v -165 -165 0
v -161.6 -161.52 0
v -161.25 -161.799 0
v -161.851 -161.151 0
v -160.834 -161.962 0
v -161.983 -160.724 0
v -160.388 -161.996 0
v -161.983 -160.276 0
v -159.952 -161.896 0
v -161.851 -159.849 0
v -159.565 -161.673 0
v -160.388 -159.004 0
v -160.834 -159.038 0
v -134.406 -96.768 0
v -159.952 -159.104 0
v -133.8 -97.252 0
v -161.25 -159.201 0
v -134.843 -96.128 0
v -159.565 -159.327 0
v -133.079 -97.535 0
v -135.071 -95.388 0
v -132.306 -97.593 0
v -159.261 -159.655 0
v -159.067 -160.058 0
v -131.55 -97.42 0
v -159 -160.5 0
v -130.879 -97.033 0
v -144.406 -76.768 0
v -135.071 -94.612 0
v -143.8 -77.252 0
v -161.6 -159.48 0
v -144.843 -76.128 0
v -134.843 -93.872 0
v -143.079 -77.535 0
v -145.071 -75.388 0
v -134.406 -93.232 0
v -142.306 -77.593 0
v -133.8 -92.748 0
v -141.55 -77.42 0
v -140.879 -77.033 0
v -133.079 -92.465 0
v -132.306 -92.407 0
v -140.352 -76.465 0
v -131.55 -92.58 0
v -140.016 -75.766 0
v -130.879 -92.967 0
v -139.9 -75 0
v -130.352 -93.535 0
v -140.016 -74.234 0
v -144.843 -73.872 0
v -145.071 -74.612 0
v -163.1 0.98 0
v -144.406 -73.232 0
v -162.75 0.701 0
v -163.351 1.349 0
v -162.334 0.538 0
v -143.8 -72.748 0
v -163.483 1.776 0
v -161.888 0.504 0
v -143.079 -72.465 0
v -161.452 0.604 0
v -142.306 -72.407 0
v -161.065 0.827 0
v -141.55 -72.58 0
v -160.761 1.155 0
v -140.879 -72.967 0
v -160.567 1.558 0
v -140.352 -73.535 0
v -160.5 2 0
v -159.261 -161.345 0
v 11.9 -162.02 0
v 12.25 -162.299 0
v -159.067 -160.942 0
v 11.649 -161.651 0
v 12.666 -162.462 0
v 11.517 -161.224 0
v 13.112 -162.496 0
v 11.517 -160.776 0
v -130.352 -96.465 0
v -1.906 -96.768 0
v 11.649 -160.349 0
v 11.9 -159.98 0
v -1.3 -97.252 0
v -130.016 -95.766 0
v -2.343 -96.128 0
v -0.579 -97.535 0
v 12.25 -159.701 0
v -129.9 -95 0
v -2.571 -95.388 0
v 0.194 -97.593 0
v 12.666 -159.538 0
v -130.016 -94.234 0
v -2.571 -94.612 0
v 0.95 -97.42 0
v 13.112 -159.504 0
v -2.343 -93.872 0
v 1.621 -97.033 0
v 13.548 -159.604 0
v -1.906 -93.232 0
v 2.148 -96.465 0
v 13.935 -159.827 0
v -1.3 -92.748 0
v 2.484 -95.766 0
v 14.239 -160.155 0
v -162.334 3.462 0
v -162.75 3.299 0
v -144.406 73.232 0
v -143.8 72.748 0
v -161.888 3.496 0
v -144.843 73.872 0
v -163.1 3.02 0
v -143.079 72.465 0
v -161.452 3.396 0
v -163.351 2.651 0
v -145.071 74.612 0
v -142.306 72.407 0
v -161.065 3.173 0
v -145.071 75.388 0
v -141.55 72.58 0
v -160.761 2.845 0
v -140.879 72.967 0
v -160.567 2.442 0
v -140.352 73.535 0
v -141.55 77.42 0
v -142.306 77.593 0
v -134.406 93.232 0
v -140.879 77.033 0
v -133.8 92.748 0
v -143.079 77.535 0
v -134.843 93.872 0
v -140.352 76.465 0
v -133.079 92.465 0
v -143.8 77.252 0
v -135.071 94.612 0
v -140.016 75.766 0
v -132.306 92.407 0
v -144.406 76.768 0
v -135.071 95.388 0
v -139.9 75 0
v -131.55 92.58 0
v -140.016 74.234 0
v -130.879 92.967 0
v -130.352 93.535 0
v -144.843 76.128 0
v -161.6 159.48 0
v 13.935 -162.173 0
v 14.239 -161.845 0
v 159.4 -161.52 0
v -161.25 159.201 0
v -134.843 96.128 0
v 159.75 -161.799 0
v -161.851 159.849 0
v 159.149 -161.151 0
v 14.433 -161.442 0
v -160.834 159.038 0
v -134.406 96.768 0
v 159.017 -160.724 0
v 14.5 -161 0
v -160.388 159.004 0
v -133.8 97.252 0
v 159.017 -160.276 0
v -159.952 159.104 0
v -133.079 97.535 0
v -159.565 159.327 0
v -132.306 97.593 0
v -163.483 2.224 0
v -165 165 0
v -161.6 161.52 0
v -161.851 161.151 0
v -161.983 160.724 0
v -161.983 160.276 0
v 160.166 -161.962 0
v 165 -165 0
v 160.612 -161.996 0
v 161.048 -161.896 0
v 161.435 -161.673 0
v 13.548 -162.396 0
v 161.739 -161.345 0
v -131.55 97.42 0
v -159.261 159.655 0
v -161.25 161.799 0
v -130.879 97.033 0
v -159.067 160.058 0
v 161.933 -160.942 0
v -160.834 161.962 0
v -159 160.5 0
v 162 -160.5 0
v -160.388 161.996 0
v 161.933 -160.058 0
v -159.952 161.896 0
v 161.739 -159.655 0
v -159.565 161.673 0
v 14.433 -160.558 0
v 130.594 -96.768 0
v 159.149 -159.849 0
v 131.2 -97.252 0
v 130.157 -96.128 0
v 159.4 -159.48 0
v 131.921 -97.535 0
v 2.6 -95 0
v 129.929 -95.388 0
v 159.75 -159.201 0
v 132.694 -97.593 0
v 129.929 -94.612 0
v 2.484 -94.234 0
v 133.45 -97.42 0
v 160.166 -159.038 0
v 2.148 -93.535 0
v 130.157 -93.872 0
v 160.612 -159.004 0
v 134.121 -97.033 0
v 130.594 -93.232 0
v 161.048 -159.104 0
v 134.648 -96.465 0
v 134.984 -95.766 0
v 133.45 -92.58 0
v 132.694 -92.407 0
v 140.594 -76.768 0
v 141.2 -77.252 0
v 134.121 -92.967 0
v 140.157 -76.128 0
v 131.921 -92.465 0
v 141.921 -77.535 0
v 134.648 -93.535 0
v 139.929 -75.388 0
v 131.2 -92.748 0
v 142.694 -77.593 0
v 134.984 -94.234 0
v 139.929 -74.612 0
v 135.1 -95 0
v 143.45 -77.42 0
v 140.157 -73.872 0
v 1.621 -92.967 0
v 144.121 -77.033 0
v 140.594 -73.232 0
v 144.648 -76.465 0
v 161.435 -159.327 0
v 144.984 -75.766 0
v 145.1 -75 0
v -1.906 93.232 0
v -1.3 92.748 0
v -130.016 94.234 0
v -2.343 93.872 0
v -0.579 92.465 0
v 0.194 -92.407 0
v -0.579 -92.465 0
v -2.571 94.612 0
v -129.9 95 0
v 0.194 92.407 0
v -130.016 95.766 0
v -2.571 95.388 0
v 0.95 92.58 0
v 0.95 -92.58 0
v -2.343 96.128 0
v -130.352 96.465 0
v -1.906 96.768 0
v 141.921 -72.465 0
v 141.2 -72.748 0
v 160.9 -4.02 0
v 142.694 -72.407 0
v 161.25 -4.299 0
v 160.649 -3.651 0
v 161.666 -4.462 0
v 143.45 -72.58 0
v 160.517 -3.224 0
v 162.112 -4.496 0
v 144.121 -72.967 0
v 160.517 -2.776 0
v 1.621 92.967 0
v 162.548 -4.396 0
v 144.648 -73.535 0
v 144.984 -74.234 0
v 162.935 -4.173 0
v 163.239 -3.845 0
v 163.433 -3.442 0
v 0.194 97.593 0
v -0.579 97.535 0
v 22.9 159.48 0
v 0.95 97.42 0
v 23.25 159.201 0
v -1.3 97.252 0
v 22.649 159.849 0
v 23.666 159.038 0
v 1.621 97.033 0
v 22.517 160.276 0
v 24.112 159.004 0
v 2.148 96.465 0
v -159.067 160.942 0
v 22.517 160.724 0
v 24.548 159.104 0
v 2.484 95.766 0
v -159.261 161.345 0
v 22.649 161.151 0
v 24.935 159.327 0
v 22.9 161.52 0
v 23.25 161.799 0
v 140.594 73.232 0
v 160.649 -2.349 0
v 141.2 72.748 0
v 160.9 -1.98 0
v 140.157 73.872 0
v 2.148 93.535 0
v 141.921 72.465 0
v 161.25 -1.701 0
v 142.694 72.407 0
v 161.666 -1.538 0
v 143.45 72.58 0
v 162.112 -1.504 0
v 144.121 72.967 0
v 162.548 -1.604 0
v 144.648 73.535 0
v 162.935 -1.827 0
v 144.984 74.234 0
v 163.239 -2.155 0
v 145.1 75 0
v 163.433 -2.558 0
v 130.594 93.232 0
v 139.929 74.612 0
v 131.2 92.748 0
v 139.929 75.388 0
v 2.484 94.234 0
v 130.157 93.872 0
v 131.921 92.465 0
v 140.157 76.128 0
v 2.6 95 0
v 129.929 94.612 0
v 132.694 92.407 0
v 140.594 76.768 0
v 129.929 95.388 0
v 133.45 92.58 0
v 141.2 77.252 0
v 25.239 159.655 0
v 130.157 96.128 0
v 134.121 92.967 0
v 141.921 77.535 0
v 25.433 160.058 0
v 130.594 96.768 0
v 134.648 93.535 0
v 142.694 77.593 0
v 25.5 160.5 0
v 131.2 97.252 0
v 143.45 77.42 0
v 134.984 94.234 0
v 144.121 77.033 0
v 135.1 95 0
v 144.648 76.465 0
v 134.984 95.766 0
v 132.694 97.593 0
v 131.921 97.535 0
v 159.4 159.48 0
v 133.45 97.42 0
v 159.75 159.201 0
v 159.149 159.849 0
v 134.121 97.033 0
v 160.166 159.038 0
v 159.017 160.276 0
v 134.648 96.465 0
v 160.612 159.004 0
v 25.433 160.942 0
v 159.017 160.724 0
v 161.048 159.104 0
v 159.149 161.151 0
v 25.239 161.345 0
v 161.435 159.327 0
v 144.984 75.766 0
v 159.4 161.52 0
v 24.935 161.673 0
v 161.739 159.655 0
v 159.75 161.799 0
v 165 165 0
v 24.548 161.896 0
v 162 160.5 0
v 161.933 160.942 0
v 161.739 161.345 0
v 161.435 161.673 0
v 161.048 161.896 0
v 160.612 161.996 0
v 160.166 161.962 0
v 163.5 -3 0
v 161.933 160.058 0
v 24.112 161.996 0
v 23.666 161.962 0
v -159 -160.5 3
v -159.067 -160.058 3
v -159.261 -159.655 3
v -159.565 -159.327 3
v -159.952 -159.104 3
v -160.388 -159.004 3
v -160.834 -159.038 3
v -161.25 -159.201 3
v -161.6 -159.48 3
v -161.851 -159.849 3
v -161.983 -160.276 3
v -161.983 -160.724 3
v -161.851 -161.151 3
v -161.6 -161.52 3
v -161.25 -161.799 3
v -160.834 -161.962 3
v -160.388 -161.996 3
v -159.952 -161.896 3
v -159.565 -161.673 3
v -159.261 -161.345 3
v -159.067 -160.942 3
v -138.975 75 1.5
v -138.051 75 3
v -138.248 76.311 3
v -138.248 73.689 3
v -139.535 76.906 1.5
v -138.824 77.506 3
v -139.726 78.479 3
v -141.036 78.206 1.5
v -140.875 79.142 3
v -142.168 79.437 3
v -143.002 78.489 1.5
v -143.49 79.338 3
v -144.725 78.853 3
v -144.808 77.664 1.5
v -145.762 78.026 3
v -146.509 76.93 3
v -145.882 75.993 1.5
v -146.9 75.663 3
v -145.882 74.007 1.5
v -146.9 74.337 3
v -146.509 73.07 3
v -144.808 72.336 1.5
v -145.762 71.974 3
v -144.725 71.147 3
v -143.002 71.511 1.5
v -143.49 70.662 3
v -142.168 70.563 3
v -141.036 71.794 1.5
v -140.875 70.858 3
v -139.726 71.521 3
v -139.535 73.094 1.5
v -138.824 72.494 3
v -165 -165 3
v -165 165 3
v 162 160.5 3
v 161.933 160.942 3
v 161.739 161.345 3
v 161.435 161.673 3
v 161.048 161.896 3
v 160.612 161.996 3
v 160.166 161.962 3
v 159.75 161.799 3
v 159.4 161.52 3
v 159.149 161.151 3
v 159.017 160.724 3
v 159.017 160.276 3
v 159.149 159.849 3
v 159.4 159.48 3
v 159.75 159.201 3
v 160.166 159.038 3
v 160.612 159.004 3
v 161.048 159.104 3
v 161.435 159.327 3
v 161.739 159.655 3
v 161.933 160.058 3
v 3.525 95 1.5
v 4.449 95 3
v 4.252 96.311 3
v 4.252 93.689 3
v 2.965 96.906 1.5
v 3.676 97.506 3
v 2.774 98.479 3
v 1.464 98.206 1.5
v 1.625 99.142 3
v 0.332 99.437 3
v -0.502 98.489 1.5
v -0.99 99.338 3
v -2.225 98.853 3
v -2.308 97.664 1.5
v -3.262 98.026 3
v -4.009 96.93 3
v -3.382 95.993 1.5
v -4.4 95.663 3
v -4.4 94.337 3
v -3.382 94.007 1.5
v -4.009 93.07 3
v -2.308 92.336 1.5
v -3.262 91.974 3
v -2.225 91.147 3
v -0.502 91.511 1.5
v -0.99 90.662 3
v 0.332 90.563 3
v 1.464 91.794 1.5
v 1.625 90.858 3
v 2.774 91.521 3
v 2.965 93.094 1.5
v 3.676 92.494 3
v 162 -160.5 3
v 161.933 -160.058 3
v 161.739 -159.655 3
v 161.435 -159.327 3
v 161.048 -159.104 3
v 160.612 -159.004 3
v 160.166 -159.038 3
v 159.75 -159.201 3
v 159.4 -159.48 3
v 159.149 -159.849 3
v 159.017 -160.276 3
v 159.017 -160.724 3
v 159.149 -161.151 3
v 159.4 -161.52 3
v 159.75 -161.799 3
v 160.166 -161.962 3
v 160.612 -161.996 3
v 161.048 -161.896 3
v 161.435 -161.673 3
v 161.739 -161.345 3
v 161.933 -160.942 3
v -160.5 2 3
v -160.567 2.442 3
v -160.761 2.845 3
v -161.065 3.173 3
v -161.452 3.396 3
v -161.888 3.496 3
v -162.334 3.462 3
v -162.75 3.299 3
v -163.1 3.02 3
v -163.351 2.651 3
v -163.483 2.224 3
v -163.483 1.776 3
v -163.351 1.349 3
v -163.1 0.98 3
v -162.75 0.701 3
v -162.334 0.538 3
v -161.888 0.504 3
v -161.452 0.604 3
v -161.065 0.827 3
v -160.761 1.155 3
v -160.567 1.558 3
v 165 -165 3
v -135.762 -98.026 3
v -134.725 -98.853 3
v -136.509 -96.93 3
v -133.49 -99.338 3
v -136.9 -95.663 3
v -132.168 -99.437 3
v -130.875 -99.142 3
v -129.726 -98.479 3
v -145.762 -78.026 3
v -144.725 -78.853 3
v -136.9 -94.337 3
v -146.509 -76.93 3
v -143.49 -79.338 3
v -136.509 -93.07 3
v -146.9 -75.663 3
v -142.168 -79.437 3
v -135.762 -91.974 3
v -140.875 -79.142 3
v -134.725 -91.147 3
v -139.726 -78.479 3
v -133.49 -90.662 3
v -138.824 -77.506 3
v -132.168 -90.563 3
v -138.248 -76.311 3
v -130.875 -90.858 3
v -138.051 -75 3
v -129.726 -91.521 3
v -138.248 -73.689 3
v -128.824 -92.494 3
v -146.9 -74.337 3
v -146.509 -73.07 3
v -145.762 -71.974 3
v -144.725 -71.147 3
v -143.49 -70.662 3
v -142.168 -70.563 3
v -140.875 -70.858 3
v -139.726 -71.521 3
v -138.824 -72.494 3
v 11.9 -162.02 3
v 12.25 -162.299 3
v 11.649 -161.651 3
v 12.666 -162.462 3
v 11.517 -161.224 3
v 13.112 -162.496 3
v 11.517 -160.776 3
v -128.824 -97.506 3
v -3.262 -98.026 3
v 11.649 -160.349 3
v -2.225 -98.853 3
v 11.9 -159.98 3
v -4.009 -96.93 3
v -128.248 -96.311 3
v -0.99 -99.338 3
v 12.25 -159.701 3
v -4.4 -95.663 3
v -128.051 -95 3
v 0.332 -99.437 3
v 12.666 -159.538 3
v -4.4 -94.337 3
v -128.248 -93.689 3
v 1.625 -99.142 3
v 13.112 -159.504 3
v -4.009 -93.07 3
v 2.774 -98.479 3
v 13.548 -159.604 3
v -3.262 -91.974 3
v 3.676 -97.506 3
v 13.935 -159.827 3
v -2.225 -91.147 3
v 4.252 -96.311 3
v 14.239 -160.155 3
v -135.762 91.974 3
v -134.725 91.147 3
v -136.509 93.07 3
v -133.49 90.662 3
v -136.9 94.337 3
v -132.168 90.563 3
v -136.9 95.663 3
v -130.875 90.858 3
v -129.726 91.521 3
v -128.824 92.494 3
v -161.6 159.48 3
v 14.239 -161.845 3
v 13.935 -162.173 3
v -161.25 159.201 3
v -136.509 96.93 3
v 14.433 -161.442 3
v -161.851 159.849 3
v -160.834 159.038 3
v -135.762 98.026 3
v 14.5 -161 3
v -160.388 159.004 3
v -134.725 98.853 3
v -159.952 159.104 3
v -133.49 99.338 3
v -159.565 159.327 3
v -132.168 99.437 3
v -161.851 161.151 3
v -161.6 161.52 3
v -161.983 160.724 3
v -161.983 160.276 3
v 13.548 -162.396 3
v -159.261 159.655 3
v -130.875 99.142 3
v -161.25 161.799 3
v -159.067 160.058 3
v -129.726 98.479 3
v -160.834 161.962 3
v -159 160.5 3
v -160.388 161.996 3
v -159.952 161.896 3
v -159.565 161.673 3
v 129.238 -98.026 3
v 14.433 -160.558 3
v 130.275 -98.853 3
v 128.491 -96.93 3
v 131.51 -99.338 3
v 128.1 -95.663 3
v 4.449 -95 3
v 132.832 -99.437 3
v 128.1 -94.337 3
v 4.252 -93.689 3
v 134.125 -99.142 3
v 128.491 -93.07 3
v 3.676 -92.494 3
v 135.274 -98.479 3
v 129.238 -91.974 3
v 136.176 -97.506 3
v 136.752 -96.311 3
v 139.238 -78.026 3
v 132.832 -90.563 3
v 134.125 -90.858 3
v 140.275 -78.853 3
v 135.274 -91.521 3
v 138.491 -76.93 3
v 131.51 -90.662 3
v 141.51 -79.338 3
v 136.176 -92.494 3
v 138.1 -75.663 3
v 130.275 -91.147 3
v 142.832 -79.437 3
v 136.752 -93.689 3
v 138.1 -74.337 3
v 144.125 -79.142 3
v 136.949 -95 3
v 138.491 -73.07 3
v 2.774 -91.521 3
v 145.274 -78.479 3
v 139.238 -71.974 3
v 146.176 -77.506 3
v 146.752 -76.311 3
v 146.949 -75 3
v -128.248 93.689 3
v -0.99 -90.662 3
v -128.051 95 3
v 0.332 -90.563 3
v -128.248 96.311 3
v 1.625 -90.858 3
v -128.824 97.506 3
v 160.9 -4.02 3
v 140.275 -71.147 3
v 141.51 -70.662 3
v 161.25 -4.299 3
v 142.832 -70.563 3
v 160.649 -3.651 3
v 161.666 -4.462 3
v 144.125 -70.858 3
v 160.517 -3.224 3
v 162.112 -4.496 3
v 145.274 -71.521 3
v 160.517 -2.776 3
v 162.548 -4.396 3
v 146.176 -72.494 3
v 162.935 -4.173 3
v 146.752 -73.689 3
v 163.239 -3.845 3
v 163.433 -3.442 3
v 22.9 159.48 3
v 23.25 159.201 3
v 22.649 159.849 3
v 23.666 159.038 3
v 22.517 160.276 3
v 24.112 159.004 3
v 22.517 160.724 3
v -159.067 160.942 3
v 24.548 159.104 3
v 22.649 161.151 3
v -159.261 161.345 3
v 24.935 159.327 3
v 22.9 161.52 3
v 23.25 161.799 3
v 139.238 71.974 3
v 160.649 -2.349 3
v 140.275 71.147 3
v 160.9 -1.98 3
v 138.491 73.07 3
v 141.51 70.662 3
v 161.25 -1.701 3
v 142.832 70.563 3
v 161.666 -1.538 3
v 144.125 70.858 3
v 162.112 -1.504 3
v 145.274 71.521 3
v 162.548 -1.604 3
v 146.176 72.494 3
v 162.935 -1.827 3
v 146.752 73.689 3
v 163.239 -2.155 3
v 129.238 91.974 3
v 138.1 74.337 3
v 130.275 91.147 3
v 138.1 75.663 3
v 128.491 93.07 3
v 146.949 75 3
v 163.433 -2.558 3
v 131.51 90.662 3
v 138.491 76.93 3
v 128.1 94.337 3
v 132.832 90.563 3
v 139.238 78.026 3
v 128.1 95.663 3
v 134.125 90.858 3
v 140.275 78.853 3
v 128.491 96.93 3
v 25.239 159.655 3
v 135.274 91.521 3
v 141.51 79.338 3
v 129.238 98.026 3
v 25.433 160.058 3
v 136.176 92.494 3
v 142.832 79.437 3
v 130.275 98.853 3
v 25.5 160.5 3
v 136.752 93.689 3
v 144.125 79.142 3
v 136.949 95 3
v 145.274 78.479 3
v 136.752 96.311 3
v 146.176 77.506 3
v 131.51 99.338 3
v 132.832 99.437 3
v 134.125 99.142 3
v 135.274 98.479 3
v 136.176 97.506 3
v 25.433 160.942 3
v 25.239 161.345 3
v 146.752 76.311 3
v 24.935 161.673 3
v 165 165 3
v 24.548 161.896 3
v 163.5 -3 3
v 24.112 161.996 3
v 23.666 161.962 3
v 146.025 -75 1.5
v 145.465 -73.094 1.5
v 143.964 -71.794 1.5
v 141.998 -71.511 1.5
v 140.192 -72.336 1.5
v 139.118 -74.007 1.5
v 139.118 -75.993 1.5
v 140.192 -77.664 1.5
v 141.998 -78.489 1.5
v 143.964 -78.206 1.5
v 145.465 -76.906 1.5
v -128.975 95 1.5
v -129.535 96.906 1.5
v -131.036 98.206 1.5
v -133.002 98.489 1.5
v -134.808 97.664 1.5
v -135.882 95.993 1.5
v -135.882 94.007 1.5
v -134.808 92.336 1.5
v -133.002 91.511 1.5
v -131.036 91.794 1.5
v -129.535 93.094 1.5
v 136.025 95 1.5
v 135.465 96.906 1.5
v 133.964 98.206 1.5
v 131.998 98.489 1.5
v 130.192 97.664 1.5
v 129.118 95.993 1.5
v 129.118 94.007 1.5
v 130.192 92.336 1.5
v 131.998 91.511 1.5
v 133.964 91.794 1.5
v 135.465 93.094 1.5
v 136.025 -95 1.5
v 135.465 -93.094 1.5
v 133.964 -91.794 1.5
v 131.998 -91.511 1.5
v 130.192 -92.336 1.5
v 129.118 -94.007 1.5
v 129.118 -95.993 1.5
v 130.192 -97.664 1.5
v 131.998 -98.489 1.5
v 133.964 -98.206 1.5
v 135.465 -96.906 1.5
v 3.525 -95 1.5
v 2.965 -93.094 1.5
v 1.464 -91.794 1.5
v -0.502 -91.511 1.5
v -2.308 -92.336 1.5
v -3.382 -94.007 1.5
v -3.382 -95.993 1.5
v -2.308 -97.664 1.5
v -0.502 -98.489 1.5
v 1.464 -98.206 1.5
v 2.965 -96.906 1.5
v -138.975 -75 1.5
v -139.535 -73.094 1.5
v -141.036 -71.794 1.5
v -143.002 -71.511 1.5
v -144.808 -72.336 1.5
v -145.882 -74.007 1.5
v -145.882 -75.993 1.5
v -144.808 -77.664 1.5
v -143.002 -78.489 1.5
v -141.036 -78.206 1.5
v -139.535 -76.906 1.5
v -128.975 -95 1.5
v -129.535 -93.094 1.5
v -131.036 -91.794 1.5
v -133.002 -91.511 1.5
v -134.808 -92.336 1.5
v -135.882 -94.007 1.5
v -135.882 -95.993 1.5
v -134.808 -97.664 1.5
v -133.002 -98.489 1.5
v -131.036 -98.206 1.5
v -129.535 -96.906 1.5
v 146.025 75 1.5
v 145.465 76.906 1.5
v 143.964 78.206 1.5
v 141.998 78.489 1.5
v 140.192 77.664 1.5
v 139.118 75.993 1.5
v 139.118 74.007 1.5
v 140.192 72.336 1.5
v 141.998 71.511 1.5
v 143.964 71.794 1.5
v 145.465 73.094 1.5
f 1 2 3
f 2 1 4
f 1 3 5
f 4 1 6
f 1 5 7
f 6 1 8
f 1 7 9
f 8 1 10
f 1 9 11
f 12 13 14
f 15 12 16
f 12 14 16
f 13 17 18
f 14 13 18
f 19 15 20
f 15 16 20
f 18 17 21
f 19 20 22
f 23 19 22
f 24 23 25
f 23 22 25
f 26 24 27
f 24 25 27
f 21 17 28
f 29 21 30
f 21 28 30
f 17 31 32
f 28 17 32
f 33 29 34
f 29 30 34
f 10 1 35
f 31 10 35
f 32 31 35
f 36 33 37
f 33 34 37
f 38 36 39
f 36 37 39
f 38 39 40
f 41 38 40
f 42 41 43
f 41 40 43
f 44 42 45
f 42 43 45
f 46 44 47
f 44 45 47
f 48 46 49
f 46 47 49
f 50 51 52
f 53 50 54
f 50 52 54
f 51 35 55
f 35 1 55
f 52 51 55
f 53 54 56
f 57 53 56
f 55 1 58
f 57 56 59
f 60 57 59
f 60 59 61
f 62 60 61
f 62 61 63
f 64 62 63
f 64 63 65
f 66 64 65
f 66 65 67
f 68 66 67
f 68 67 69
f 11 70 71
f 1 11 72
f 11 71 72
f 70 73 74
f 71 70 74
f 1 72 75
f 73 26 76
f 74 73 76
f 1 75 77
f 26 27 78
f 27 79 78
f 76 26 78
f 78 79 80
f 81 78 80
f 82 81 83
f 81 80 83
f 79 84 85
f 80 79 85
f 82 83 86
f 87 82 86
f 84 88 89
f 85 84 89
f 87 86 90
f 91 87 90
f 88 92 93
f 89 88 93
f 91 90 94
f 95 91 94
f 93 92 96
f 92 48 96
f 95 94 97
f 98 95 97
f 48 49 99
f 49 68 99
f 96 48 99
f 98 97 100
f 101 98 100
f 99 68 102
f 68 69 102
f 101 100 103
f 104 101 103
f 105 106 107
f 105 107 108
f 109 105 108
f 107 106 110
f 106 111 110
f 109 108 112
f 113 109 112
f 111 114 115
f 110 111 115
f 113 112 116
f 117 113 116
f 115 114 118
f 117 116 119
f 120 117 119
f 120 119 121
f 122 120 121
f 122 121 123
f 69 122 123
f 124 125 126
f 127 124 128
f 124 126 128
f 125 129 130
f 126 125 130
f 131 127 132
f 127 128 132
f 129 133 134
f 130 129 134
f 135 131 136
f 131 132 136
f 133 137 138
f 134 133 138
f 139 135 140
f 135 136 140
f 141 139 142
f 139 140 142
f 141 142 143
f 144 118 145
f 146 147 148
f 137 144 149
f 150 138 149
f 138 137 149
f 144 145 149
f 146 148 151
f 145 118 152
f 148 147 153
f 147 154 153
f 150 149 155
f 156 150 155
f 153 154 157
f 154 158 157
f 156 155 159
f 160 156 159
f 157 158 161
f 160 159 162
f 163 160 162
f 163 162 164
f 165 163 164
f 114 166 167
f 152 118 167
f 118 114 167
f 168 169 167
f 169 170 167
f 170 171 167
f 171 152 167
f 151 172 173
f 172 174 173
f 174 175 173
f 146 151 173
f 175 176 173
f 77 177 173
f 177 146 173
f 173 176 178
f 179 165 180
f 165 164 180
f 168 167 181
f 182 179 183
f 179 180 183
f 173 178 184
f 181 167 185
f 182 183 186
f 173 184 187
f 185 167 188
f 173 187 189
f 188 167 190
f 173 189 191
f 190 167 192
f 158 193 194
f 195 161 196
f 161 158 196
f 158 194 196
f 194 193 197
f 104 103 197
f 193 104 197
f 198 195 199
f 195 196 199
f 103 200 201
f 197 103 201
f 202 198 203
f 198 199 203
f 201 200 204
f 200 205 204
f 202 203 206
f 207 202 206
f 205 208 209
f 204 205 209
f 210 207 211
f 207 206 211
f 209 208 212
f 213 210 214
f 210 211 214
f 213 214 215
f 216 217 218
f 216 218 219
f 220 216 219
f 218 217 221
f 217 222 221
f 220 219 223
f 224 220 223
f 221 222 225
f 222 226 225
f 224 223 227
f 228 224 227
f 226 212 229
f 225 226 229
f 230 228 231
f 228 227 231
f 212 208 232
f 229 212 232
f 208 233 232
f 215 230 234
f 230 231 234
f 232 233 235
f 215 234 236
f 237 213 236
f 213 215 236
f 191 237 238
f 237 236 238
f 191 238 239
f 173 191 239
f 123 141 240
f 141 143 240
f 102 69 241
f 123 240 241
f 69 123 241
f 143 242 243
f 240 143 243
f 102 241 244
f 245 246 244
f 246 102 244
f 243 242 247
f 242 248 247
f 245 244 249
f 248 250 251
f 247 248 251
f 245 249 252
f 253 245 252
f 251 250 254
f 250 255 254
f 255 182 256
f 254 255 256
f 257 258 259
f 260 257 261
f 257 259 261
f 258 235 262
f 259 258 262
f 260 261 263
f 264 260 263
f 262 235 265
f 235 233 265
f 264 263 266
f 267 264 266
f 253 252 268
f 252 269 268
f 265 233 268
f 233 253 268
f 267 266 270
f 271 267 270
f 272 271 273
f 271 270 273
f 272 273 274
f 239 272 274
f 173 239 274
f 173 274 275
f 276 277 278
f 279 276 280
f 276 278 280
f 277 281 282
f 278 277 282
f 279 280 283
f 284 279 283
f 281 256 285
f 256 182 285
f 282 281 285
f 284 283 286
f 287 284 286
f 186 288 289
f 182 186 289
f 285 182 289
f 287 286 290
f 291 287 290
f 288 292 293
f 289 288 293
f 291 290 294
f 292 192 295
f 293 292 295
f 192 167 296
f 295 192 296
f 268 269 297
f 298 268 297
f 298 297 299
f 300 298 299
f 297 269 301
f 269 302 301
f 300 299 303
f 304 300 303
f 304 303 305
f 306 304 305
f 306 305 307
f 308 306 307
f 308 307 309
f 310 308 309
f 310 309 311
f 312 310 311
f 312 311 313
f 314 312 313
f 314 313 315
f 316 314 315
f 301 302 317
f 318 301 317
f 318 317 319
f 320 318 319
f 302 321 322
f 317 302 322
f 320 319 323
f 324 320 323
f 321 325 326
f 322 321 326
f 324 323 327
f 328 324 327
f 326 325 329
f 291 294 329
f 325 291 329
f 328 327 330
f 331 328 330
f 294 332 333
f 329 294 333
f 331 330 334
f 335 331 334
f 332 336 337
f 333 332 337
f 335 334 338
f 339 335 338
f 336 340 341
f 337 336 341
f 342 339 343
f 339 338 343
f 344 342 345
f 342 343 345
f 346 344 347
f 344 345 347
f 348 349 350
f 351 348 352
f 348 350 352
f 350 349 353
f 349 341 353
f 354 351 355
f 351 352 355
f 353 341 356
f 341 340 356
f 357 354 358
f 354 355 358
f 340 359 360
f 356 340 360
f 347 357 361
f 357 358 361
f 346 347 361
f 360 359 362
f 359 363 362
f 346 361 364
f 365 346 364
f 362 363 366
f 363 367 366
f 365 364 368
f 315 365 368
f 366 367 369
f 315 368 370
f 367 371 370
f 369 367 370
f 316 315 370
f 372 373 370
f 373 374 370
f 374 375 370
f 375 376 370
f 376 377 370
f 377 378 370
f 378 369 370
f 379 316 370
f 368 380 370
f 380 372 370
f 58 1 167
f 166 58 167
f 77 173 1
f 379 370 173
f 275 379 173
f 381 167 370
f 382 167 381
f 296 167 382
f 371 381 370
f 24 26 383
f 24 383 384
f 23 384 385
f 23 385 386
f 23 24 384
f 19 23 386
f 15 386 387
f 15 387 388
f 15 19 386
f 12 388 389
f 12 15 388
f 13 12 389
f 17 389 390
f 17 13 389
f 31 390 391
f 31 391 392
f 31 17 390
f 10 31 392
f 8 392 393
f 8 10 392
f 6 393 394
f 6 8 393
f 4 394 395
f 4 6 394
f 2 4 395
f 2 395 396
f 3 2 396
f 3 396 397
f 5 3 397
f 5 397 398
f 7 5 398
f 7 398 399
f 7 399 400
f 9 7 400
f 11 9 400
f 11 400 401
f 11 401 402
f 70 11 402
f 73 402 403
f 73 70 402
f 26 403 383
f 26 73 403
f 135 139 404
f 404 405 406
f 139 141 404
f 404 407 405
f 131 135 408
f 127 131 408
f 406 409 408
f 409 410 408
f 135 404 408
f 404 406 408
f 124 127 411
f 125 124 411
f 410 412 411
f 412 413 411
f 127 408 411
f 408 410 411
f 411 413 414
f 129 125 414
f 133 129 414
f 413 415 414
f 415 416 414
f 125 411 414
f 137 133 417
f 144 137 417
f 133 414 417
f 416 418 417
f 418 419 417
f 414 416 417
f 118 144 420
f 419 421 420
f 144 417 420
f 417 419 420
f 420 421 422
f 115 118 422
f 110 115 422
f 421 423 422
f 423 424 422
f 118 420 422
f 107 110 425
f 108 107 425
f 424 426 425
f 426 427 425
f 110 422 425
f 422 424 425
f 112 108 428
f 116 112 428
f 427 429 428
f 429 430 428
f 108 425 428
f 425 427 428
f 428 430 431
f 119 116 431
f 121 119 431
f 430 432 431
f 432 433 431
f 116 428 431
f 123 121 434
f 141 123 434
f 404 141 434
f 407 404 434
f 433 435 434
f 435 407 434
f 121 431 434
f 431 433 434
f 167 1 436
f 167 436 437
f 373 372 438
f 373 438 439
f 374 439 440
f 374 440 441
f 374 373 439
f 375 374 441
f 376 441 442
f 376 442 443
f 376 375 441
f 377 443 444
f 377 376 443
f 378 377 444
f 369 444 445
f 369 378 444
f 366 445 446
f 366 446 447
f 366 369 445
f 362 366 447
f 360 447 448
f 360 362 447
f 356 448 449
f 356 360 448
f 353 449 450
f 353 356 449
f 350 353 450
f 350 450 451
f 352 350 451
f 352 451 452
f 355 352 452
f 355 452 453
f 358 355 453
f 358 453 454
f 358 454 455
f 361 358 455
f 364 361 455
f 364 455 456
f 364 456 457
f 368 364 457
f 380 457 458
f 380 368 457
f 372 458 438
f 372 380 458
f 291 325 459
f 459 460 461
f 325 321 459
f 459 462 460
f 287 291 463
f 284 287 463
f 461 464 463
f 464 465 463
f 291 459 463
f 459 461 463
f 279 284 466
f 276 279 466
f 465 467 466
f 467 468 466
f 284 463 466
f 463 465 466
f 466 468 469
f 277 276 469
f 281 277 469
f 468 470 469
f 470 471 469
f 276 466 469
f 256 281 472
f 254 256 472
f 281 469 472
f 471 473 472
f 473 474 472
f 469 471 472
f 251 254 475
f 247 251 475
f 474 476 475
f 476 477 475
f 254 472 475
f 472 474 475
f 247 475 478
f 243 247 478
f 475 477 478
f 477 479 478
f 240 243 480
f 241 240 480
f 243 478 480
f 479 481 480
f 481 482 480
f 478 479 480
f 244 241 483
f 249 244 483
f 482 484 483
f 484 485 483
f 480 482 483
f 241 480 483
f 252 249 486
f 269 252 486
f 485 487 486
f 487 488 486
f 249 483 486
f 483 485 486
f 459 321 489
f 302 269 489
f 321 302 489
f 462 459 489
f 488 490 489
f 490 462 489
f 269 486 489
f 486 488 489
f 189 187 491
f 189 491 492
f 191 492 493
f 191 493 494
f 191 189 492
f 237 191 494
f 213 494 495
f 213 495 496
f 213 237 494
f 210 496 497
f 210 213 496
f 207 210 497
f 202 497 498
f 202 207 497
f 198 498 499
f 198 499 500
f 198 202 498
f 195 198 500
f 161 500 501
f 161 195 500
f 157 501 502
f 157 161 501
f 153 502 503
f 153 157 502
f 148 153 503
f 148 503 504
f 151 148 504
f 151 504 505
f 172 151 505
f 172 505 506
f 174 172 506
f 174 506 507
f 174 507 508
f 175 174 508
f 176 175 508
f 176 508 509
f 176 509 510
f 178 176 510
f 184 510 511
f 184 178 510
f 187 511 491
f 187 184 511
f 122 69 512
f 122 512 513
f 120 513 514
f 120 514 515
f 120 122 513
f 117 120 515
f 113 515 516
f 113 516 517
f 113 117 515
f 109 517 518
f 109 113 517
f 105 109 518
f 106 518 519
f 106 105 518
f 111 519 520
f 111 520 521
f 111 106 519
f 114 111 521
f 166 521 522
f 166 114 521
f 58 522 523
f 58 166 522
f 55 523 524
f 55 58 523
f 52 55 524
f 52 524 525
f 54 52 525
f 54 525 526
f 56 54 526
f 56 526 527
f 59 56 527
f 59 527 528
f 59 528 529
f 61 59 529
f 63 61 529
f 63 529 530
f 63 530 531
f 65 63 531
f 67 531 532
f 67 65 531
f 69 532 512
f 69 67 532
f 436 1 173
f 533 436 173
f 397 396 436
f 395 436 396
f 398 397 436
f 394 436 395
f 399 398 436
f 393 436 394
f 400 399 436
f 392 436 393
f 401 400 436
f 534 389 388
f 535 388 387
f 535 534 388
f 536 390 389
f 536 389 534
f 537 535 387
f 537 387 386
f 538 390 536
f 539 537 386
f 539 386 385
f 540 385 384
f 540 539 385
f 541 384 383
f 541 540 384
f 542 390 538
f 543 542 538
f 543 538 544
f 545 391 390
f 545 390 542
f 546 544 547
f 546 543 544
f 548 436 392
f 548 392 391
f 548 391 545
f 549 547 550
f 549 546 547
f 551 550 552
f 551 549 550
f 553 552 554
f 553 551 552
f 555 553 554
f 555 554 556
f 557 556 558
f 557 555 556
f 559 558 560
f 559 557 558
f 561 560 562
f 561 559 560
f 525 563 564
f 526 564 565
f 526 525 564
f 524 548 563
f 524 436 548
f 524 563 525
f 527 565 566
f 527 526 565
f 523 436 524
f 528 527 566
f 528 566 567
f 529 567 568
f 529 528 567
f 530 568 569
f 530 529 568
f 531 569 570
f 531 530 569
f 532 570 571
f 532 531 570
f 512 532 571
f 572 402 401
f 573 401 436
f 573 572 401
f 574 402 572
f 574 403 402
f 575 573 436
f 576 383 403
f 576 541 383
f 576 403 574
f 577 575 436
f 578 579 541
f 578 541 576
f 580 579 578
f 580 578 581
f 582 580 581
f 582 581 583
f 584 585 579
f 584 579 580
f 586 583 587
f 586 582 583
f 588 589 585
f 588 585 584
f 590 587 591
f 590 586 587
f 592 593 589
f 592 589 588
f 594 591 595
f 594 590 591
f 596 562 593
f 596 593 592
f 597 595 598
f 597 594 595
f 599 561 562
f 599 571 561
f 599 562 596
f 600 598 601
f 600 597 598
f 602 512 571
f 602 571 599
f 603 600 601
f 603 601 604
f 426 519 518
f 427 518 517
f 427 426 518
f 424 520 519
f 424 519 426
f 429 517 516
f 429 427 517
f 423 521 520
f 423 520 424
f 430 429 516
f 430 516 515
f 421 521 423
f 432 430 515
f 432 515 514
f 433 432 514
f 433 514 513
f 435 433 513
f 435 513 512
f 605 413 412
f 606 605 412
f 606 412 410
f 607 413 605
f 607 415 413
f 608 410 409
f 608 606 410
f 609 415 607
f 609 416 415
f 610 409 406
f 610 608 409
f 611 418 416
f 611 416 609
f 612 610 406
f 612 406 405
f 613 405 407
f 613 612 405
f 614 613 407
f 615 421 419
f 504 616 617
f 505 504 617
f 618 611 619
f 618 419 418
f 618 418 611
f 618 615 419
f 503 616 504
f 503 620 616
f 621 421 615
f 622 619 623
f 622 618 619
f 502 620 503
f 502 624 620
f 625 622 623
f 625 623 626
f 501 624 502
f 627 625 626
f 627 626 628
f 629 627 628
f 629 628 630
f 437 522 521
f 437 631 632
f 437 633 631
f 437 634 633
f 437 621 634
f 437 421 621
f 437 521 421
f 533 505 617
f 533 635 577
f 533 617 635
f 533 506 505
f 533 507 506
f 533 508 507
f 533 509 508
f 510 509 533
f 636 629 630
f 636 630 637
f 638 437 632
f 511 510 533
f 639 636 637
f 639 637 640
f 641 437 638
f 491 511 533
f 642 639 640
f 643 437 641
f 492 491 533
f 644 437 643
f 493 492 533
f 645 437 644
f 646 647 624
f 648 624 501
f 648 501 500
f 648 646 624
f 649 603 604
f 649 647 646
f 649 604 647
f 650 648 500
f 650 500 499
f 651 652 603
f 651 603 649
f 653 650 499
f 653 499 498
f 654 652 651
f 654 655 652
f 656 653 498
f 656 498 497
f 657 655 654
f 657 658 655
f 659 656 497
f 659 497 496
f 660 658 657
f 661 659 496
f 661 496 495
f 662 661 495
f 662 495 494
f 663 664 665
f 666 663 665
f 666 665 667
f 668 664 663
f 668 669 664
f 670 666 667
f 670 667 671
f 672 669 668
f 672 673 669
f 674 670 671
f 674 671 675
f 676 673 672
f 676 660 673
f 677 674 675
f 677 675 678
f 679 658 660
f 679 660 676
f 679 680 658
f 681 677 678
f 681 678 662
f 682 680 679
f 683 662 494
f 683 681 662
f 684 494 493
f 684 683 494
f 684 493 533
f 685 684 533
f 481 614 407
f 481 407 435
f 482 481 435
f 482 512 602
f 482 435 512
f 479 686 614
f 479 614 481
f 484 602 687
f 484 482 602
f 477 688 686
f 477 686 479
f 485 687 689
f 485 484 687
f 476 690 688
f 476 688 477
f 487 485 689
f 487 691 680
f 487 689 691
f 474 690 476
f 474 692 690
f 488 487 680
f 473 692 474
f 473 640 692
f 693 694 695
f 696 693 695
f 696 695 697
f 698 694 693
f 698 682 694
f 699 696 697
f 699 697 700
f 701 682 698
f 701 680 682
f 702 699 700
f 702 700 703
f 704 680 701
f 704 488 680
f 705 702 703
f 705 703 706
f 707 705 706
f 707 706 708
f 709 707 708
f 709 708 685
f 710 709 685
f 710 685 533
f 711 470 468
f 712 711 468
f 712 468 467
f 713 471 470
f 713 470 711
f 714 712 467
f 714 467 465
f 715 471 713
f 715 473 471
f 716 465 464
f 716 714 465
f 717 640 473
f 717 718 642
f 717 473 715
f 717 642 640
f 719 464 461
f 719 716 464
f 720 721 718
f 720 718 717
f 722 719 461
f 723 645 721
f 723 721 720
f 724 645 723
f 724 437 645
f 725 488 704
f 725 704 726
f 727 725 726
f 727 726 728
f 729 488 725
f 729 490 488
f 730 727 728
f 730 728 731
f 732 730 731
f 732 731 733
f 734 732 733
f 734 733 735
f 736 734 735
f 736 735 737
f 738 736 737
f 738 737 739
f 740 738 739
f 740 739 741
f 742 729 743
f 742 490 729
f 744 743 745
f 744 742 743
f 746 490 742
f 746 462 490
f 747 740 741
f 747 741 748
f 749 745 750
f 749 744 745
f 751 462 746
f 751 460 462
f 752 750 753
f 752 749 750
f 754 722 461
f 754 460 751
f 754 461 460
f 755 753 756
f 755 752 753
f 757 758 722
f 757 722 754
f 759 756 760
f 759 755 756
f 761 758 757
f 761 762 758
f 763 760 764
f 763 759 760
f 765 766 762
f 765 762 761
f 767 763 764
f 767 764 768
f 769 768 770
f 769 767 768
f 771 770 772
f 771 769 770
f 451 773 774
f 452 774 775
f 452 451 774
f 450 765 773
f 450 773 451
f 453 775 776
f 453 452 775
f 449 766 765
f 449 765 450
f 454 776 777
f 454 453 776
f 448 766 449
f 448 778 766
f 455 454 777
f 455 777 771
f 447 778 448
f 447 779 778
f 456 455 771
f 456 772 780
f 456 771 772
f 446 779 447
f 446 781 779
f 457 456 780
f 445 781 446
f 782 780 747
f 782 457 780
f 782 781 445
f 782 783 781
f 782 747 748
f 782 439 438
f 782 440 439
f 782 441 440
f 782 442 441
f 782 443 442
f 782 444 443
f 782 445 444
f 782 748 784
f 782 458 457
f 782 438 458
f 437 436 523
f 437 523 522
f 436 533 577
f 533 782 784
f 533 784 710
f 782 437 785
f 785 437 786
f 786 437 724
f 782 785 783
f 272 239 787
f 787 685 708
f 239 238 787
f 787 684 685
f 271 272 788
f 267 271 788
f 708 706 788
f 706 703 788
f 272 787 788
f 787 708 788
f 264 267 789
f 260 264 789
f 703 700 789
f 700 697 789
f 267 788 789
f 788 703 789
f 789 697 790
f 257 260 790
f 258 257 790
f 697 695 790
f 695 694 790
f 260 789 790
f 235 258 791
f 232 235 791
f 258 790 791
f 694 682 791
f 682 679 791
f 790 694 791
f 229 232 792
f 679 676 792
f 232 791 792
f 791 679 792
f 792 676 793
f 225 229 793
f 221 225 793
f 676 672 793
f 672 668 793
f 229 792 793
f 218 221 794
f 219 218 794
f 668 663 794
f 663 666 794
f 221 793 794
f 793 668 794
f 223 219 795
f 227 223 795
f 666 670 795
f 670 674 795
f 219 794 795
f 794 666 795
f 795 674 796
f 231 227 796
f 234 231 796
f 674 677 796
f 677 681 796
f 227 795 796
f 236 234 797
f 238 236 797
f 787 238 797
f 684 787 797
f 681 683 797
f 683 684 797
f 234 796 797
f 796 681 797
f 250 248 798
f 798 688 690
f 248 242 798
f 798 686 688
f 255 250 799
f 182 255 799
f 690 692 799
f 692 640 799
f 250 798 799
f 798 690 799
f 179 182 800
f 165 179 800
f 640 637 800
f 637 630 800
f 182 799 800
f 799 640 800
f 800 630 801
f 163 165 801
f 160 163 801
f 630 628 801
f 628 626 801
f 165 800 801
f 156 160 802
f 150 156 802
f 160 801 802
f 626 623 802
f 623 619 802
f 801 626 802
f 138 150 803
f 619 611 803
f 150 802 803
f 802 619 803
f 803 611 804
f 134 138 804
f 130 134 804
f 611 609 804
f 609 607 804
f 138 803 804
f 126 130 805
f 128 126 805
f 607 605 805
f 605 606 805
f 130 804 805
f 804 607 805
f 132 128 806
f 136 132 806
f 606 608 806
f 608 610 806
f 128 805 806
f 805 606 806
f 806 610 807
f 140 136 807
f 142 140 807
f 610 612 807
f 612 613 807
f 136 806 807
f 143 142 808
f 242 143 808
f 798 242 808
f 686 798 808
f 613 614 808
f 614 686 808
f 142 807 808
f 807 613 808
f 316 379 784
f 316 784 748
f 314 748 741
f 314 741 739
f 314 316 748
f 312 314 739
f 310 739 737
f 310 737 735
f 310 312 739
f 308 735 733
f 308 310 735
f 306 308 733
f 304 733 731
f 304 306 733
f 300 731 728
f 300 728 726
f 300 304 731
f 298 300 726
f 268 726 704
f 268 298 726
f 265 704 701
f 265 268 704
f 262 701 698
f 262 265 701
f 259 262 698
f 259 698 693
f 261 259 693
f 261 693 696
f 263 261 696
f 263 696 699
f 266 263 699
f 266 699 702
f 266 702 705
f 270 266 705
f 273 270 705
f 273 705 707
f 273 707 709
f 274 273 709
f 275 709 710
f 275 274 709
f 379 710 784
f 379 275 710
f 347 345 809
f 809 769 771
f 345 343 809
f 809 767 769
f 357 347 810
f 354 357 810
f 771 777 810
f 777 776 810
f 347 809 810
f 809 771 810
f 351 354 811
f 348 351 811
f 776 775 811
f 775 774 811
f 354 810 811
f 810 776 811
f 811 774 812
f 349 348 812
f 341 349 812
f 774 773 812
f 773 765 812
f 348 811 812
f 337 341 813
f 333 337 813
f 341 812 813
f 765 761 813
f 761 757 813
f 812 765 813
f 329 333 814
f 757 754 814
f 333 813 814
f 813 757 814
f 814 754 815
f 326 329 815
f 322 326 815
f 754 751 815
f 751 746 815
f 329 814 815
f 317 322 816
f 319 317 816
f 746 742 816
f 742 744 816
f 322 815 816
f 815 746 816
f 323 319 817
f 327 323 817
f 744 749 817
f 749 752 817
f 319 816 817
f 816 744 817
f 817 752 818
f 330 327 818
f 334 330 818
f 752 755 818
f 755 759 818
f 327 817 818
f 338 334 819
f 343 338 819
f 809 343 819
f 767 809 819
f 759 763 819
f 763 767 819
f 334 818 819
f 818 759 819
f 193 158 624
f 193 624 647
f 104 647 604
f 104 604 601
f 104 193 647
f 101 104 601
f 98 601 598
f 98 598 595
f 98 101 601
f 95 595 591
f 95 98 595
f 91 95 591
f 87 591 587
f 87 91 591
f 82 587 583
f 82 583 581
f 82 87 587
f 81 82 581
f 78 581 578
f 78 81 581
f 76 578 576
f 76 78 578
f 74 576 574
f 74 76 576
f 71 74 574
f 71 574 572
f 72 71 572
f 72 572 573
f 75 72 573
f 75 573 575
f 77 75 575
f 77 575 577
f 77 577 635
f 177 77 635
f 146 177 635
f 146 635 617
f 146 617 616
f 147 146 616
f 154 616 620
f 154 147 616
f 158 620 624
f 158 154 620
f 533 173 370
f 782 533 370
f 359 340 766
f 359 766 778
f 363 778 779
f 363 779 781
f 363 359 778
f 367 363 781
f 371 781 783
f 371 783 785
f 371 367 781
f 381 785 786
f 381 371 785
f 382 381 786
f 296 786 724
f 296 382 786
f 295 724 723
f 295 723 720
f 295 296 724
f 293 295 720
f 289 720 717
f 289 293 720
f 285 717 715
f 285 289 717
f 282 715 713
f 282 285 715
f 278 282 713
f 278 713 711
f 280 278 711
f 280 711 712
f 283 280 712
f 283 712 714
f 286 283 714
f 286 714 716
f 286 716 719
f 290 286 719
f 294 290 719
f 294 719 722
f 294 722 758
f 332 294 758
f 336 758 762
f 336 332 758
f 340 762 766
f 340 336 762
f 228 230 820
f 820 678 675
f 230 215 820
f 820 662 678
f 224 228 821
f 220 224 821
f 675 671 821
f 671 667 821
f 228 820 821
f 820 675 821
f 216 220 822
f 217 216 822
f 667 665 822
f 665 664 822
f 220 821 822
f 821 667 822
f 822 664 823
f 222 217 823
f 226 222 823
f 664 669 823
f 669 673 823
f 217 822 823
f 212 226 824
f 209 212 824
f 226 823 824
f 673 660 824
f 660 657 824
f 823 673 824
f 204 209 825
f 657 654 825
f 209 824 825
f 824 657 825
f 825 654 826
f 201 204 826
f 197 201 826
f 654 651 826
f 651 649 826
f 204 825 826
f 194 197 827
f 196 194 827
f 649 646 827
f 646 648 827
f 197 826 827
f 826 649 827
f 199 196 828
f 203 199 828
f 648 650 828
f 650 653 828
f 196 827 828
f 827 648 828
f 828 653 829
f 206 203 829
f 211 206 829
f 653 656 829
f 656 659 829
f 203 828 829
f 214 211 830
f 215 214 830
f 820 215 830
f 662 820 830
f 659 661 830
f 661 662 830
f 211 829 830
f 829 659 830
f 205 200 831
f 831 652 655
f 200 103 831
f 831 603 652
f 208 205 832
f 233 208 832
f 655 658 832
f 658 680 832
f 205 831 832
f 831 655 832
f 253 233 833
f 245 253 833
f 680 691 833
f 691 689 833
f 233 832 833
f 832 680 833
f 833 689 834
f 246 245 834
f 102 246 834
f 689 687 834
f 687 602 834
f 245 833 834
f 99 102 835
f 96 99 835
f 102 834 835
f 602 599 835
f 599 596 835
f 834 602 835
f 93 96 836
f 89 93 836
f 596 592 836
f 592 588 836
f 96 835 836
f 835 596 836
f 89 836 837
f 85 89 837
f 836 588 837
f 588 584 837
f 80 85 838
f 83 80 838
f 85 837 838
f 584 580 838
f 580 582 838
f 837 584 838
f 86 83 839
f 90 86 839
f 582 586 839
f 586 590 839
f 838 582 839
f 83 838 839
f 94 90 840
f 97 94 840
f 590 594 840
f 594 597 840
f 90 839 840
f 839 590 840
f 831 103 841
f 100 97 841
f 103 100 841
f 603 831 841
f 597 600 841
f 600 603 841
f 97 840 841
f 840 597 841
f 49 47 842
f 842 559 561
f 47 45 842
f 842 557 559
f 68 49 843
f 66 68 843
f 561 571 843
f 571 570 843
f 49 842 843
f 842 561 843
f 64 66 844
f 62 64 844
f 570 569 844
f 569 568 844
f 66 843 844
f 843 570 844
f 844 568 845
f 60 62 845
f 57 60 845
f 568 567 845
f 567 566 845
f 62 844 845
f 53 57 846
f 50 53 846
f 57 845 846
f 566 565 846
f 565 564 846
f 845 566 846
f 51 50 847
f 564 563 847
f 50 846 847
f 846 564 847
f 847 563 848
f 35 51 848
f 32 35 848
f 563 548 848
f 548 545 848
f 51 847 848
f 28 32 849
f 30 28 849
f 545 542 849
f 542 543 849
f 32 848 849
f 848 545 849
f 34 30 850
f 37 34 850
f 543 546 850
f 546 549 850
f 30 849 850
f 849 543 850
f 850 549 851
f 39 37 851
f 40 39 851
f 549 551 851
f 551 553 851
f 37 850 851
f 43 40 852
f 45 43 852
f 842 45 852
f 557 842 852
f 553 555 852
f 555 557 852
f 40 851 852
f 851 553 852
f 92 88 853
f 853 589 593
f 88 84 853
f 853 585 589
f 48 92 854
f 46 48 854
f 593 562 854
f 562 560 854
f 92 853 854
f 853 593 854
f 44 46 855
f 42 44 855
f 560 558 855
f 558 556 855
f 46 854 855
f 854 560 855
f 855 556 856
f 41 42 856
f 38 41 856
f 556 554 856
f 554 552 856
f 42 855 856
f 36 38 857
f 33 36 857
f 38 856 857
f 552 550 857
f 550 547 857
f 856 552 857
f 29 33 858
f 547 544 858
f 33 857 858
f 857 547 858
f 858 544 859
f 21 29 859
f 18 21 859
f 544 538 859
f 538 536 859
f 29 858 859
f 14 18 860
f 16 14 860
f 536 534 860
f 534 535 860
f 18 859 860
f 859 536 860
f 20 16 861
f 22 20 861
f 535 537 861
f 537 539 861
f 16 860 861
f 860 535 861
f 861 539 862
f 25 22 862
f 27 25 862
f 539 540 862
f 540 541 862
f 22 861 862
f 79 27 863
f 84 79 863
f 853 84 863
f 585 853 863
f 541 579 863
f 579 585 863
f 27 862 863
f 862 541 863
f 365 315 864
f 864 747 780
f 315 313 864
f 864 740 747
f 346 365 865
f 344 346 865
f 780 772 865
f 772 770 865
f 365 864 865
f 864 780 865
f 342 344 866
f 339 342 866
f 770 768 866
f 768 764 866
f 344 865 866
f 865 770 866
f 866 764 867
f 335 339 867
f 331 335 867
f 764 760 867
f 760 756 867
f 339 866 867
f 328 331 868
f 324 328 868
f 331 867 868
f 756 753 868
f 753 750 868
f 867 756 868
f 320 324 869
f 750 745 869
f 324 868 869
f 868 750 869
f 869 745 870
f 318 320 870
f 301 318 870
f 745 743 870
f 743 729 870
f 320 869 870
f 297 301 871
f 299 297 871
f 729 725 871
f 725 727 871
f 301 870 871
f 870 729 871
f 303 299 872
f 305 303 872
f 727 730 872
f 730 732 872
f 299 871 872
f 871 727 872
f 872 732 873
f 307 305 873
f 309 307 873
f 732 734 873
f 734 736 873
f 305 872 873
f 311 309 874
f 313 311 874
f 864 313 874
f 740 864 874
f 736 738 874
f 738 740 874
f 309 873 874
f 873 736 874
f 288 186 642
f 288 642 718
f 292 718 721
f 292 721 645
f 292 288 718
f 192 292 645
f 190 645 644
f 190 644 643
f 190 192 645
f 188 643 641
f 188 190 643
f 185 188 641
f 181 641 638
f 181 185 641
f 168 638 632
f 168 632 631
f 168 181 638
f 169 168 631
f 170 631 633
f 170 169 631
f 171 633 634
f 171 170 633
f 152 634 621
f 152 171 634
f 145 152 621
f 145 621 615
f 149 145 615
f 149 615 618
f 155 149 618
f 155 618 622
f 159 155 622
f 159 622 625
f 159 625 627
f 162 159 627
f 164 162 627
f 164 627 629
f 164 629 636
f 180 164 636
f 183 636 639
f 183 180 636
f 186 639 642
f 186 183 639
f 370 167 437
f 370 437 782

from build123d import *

# Parameters (mm, degrees)
F0_W       = 330
F0_H       = 330
F0_R       = 1.5
F0_R_2     = 2.6
F1_DEPTH   = 3
F2_SIZE2   = 1.849213
F2_SIZE    = 2.99999
F3_SIZE2   = 1.849213
F3_SIZE    = 2.99999
F3_2_SIZE2 = 1.849213
F3_2_SIZE  = 2.99999
F3_3_SIZE2 = 1.849213
F3_3_SIZE  = 2.99999
F3_4_SIZE2 = 1.849213
F3_4_SIZE  = 2.99999
F3_5_SIZE2 = 1.849213
F3_5_SIZE  = 2.99999
F3_6_SIZE2 = 1.849213
F3_6_SIZE  = 2.99999
F3_7_SIZE2 = 1.849213
F3_7_SIZE  = 2.99999
F3_8_SIZE2 = 1.849213
F3_8_SIZE  = 2.99999
F3_9_SIZE2 = 1.849213
F3_9_SIZE  = 2.99999


# Not quite as in the source:
# - a fillet or chamfer is up to 0.001 mm smaller than in the source, because OpenCascade refuses the exact size


with BuildPart() as f1:
    # F0 (on Top) → F1 (new body)
    with BuildSketch(Plane.XY):
        Rectangle(F0_W, F0_H)
        with Locations((-160.5, -160.5)):
            Circle(F0_R, mode=Mode.SUBTRACT)
        with Locations((-132.5, -95)):
            Circle(F0_R_2, mode=Mode.SUBTRACT)
        with Locations((-142.5, -75)):
            Circle(F0_R_2, mode=Mode.SUBTRACT)
        with Locations((13, -161)):
            Circle(F0_R, mode=Mode.SUBTRACT)
        with Locations((0, -95)):
            Circle(F0_R_2, mode=Mode.SUBTRACT)
        with Locations((160.5, -160.5)):
            Circle(F0_R, mode=Mode.SUBTRACT)
        with Locations((132.5, -95)):
            Circle(F0_R_2, mode=Mode.SUBTRACT)
        with Locations((142.5, -75)):
            Circle(F0_R_2, mode=Mode.SUBTRACT)
        with Locations((162, -3)):
            Circle(F0_R, mode=Mode.SUBTRACT)
        with Locations((-162, 2)):
            Circle(F0_R, mode=Mode.SUBTRACT)
        with Locations((-142.5, 75)):
            Circle(F0_R_2, mode=Mode.SUBTRACT)
        with Locations((-132.5, 95)):
            Circle(F0_R_2, mode=Mode.SUBTRACT)
        with Locations((-160.5, 160.5)):
            Circle(F0_R, mode=Mode.SUBTRACT)
        with Locations((142.5, 75)):
            Circle(F0_R_2, mode=Mode.SUBTRACT)
        with Locations((0, 95)):
            Circle(F0_R_2, mode=Mode.SUBTRACT)
        with Locations((24, 160.5)):
            Circle(F0_R, mode=Mode.SUBTRACT)
        with Locations((132.5, 95)):
            Circle(F0_R_2, mode=Mode.SUBTRACT)
        with Locations((160.5, 160.5)):
            Circle(F0_R, mode=Mode.SUBTRACT)
    extrude(amount=F1_DEPTH)

    # F2 (size 3 and 1.8492230955 in the source; OpenCascade refuses exactly that, so slightly less here)
    f2_edges = [f1.edges().sort_by_distance(p)[0] for p in [
        (-135.1, 95, 3),
    ]]
    f2_side = f1.faces().sort_by_distance((-135.1, 95, 1.5))[0]
    chamfer(f2_edges, length=F2_SIZE, length2=F2_SIZE2, reference=f2_side)

    # F3 (size 3 and 1.8492230955 in the source; OpenCascade refuses exactly that, so slightly less here)
    f3_edges = [f1.edges().sort_by_distance(p)[0] for p in [
        (-145.1, 75, 3),
    ]]
    f3_side = f1.faces().sort_by_distance((-145.1, 75, 1.5))[0]
    chamfer(f3_edges, length=F3_SIZE, length2=F3_SIZE2, reference=f3_side)

    # F3#2 (size 3 and 1.8492230955 in the source; OpenCascade refuses exactly that, so slightly less here)
    f3_2_edges = [f1.edges().sort_by_distance(p)[0] for p in [
        (-2.6, 95, 3),
    ]]
    f3_2_side = f1.faces().sort_by_distance((-2.6, 95, 1.5))[0]
    chamfer(f3_2_edges, length=F3_2_SIZE, length2=F3_2_SIZE2, reference=f3_2_side)

    # F3#3 (size 3 and 1.8492230955 in the source; OpenCascade refuses exactly that, so slightly less here)
    f3_3_edges = [f1.edges().sort_by_distance(p)[0] for p in [
        (129.9, 95, 3),
    ]]
    f3_3_side = f1.faces().sort_by_distance((129.9, 95, 1.5))[0]
    chamfer(f3_3_edges, length=F3_3_SIZE, length2=F3_3_SIZE2, reference=f3_3_side)

    # F3#4 (size 3 and 1.8492230955 in the source; OpenCascade refuses exactly that, so slightly less here)
    f3_4_edges = [f1.edges().sort_by_distance(p)[0] for p in [
        (139.9, 75, 3),
    ]]
    f3_4_side = f1.faces().sort_by_distance((139.9, 75, 1.5))[0]
    chamfer(f3_4_edges, length=F3_4_SIZE, length2=F3_4_SIZE2, reference=f3_4_side)

    # F3#5 (size 3 and 1.8492230955 in the source; OpenCascade refuses exactly that, so slightly less here)
    f3_5_edges = [f1.edges().sort_by_distance(p)[0] for p in [
        (139.9, -75, 3),
    ]]
    f3_5_side = f1.faces().sort_by_distance((139.9, -75, 1.5))[0]
    chamfer(f3_5_edges, length=F3_5_SIZE, length2=F3_5_SIZE2, reference=f3_5_side)

    # F3#6 (size 3 and 1.8492230955 in the source; OpenCascade refuses exactly that, so slightly less here)
    f3_6_edges = [f1.edges().sort_by_distance(p)[0] for p in [
        (129.9, -95, 3),
    ]]
    f3_6_side = f1.faces().sort_by_distance((129.9, -95, 1.5))[0]
    chamfer(f3_6_edges, length=F3_6_SIZE, length2=F3_6_SIZE2, reference=f3_6_side)

    # F3#7 (size 3 and 1.8492230955 in the source; OpenCascade refuses exactly that, so slightly less here)
    f3_7_edges = [f1.edges().sort_by_distance(p)[0] for p in [
        (-2.6, -95, 3),
    ]]
    f3_7_side = f1.faces().sort_by_distance((-2.6, -95, 1.5))[0]
    chamfer(f3_7_edges, length=F3_7_SIZE, length2=F3_7_SIZE2, reference=f3_7_side)

    # F3#8 (size 3 and 1.8492230955 in the source; OpenCascade refuses exactly that, so slightly less here)
    f3_8_edges = [f1.edges().sort_by_distance(p)[0] for p in [
        (-135.1, -95, 3),
    ]]
    f3_8_side = f1.faces().sort_by_distance((-135.1, -95, 1.5))[0]
    chamfer(f3_8_edges, length=F3_8_SIZE, length2=F3_8_SIZE2, reference=f3_8_side)

    # F3#9 (size 3 and 1.8492230955 in the source; OpenCascade refuses exactly that, so slightly less here)
    f3_9_edges = [f1.edges().sort_by_distance(p)[0] for p in [
        (-145.1, -75, 3),
    ]]
    f3_9_side = f1.faces().sort_by_distance((-145.1, -75, 1.5))[0]
    chamfer(f3_9_edges, length=F3_9_SIZE, length2=F3_9_SIZE2, reference=f3_9_side)


solid = f1.part
